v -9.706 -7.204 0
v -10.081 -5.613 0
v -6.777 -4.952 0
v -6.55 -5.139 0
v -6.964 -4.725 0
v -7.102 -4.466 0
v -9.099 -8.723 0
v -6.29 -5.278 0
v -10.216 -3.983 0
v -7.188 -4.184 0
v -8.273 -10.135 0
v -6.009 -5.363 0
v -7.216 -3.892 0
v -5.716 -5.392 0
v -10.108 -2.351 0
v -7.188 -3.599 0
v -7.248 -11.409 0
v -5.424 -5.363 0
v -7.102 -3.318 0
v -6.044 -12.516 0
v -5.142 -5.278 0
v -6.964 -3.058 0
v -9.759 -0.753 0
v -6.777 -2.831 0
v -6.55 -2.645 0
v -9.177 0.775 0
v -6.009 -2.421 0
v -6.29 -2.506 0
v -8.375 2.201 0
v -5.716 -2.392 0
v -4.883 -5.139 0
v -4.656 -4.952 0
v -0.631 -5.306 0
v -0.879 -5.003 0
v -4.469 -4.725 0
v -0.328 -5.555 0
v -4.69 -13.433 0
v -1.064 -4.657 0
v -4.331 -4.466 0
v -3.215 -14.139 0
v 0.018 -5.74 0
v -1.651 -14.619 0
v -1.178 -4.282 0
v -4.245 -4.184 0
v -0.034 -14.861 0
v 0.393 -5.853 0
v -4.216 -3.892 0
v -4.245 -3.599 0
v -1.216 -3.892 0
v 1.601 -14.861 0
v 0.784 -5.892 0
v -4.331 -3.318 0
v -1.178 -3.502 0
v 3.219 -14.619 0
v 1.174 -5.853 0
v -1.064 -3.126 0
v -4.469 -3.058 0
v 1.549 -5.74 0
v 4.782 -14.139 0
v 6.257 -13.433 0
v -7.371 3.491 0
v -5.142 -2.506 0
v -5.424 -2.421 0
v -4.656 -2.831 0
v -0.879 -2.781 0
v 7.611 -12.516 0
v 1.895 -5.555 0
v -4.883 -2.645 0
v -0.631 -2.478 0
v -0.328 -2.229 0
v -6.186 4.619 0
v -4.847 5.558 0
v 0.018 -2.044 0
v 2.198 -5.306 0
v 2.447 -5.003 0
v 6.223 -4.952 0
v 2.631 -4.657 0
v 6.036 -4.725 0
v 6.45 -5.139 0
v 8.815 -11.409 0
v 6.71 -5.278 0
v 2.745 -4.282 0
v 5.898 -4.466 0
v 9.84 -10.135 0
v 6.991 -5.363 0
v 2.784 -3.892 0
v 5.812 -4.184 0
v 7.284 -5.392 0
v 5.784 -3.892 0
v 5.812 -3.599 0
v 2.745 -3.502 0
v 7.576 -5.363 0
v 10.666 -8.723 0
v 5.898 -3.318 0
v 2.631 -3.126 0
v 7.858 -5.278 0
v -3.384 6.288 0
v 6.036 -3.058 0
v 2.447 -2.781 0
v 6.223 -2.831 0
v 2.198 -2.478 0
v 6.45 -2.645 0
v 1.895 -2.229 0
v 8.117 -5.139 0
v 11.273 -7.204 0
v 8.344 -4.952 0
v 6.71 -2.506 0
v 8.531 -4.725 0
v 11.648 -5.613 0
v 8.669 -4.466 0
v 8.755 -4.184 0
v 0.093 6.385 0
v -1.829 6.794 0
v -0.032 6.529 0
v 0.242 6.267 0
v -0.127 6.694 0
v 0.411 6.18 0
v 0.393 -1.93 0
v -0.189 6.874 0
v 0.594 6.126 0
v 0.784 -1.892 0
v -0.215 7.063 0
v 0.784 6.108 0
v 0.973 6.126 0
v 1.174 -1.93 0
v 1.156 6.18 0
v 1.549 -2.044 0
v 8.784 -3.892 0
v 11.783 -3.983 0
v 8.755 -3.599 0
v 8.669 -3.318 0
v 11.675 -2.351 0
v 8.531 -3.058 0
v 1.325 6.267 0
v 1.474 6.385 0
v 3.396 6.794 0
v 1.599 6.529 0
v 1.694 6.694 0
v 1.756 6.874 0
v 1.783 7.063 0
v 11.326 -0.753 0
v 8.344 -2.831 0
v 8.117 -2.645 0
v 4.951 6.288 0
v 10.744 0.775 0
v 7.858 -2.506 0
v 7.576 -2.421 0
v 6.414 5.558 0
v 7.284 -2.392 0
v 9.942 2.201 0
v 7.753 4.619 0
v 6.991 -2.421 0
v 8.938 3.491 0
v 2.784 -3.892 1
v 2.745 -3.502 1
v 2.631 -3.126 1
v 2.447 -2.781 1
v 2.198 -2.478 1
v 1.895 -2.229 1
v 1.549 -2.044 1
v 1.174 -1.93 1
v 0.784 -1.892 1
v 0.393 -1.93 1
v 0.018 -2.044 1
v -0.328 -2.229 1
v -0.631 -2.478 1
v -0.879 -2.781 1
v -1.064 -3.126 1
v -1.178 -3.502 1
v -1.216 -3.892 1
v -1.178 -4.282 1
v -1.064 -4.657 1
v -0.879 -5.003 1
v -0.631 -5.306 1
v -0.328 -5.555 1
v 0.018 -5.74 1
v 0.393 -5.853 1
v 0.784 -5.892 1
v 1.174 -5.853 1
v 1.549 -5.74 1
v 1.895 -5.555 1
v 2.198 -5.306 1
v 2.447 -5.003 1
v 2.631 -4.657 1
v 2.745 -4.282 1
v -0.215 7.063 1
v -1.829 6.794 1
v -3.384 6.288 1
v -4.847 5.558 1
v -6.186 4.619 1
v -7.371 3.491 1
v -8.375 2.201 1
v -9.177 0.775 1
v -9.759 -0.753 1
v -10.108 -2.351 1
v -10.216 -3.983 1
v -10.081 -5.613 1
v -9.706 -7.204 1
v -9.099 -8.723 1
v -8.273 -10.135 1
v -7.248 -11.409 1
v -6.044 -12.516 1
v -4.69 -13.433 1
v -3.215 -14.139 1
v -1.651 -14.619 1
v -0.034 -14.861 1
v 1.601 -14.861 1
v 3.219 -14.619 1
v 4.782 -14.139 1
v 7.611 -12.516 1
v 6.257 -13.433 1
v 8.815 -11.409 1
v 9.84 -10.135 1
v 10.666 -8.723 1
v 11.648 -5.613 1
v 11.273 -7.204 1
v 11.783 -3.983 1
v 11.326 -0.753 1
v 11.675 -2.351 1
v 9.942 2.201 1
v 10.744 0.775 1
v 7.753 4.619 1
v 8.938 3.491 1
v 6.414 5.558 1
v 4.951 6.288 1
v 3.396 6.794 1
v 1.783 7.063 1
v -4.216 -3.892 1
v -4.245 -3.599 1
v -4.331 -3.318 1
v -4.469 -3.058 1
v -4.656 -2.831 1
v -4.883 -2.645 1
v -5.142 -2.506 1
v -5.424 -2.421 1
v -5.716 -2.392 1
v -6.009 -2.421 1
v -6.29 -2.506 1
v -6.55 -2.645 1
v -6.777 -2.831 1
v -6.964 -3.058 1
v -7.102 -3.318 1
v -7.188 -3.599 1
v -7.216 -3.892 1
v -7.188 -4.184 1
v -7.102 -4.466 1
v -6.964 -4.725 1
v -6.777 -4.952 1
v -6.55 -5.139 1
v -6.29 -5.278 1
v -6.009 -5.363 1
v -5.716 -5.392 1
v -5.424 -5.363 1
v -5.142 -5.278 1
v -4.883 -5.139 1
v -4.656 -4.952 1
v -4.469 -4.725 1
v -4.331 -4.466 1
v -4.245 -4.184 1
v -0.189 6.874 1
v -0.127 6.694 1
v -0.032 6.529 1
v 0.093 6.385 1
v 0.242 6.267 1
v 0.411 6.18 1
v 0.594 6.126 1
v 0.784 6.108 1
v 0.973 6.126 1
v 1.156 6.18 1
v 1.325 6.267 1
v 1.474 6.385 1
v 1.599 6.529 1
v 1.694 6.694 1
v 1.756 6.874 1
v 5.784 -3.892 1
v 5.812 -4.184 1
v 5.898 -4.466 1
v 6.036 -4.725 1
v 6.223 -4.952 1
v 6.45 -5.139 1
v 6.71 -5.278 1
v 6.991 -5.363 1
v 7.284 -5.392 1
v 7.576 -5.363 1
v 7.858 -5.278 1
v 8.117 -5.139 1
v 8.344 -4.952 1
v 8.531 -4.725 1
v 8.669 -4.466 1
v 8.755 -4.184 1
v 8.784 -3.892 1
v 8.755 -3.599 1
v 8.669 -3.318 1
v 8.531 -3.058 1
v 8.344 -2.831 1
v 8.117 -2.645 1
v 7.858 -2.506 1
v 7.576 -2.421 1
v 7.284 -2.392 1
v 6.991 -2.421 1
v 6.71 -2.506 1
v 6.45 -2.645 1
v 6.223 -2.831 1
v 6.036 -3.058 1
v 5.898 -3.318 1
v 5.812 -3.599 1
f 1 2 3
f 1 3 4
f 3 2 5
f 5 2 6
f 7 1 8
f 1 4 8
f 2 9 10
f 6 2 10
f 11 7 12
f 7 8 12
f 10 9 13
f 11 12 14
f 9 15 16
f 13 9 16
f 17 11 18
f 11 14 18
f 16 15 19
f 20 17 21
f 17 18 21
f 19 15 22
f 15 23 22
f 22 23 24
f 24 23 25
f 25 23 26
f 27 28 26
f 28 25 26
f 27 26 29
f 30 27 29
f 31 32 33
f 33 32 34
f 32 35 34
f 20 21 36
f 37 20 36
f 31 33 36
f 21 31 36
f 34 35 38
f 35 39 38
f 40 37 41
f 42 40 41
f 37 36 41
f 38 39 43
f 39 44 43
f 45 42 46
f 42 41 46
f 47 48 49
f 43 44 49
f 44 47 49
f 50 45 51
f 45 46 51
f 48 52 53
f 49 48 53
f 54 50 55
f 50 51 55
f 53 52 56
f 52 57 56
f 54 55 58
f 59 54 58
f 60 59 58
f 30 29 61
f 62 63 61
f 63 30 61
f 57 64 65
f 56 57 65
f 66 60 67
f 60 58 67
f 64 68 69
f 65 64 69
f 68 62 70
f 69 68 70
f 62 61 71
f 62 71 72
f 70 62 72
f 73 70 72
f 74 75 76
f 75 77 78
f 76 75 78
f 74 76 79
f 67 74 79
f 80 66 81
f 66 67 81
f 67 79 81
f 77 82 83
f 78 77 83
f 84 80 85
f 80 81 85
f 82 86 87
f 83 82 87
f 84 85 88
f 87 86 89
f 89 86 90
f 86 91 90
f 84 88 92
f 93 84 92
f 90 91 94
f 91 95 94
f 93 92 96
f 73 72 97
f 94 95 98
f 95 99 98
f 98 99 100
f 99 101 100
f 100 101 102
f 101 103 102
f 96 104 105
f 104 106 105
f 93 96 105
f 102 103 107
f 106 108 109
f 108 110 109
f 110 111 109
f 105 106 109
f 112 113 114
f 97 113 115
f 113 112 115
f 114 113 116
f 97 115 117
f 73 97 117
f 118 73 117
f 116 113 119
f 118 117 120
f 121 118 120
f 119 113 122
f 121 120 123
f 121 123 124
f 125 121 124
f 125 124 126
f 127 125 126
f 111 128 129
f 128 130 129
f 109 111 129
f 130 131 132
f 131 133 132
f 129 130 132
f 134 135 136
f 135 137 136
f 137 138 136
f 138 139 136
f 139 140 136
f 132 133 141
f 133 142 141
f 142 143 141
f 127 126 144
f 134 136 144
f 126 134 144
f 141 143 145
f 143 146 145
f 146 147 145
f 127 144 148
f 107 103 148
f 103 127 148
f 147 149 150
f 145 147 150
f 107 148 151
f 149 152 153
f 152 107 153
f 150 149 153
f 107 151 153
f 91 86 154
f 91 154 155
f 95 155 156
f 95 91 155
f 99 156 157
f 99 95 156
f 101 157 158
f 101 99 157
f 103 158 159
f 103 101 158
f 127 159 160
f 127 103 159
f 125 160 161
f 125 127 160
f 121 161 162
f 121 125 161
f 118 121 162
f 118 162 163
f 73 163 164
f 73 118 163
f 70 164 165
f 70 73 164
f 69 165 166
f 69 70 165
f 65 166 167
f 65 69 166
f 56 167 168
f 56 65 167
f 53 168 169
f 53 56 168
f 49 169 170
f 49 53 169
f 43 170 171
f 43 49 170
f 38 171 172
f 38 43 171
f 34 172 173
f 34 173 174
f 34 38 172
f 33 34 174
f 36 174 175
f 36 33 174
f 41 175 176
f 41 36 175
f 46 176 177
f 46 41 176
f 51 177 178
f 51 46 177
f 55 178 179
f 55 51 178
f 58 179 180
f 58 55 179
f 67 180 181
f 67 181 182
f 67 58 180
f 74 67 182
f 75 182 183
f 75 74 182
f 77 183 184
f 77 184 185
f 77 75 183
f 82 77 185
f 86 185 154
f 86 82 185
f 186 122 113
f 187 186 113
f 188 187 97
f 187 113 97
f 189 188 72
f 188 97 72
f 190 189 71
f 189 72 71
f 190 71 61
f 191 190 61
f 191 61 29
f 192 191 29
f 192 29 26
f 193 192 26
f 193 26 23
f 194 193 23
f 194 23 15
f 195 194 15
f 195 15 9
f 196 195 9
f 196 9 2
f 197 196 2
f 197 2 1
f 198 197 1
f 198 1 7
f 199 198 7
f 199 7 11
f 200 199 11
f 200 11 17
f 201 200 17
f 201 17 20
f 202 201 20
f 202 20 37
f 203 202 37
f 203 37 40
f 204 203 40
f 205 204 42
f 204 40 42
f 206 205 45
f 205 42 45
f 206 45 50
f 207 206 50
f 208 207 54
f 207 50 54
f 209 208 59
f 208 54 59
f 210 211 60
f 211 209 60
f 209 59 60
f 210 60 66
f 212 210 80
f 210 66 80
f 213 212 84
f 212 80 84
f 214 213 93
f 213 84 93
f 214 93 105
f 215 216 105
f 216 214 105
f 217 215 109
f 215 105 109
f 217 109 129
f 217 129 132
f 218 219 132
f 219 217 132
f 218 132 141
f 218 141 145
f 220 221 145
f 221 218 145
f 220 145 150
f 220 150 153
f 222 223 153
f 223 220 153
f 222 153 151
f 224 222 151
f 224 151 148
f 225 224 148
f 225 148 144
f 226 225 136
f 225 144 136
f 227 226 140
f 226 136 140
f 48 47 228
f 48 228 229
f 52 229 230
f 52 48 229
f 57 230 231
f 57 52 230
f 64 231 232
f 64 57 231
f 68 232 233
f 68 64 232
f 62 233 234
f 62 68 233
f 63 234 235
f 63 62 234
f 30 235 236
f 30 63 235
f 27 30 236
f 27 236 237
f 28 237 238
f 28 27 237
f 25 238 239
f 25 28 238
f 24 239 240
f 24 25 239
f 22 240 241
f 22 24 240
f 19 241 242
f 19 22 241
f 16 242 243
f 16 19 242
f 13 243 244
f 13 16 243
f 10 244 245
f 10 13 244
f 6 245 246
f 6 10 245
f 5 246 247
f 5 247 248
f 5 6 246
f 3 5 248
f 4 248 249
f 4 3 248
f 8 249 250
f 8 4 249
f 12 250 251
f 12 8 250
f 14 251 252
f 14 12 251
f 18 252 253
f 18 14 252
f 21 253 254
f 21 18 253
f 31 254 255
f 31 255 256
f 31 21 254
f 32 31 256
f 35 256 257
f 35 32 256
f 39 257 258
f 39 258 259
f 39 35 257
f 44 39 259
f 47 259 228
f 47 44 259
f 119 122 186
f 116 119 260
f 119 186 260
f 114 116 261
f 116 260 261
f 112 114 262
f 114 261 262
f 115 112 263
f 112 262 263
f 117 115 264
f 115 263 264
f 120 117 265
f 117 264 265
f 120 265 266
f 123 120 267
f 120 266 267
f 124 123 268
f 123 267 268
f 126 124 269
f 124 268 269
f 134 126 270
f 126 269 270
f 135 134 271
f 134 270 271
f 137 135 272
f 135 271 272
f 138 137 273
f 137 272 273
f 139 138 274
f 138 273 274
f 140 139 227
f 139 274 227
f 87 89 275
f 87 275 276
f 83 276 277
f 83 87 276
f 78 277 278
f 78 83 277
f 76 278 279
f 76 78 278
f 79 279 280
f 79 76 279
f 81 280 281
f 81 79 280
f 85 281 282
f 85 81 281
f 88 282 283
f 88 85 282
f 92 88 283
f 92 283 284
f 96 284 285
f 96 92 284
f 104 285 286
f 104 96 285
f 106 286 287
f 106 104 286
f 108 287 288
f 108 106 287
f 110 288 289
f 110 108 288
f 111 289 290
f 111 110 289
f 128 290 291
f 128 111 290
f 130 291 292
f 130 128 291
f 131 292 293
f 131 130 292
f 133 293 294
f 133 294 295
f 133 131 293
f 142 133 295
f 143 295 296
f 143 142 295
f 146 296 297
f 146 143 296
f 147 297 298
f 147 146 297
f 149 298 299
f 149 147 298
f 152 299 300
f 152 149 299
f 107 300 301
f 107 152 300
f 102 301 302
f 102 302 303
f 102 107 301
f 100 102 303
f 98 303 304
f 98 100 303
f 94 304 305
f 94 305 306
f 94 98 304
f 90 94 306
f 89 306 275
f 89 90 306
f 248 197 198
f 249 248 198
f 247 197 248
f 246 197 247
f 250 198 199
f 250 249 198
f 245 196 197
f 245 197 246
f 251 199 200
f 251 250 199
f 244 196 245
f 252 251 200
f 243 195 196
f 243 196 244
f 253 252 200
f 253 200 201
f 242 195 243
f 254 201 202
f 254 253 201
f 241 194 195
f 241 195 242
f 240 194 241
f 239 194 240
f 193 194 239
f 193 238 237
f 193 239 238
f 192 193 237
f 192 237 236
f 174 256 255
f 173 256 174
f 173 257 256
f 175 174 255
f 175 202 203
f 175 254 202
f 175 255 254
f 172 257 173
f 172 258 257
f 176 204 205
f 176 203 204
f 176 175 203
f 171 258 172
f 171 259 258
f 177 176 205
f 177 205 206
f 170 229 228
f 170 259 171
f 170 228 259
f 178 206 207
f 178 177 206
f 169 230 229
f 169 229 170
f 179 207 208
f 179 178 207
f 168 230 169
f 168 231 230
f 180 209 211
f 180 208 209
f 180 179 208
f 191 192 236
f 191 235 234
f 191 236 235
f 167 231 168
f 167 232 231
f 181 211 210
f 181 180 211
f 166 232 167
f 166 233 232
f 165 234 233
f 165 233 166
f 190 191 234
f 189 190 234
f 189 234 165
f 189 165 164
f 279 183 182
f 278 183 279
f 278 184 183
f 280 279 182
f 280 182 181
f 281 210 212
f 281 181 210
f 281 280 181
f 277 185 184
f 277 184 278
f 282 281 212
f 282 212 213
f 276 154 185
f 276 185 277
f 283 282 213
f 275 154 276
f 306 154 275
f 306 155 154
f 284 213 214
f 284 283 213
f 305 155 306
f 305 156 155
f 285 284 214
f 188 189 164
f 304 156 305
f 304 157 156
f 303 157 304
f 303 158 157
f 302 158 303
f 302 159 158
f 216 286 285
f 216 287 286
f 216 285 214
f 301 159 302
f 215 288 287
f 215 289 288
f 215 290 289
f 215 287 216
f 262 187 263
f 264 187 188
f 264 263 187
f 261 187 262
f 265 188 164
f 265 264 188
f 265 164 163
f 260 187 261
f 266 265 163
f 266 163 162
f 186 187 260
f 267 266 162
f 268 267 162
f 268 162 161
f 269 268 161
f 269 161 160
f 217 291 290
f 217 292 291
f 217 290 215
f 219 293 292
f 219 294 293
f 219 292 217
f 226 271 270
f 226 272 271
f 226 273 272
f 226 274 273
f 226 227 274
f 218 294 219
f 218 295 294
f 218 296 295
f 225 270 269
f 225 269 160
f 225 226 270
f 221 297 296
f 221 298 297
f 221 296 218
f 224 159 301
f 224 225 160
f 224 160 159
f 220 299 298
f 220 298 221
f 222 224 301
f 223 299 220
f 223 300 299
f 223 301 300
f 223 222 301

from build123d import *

# Parameters (mm, degrees)
SKETCH_1_R          = 11
SKETCH_1_R_2        = 1.5
SKETCH_1_R_3        = 2
EXTRUDE_1_DEPTH     = 1
SKETCH_2_R          = 1
CUT_EXTRUDE_1_DEPTH = 10


with BuildPart() as part:
    # 草图1 → 凸台-拉伸1 (new body)
    with BuildSketch(Plane.XY):
        with Locations((0.783567134, -3.891783567)):
            Circle(SKETCH_1_R)
        with Locations((-5.716432866, -3.891783567)):
            Circle(SKETCH_1_R_2, mode=Mode.SUBTRACT)
        with Locations(Location((7.283567134, -3.891783567, 0), (0, 0, 180))):
            Circle(SKETCH_1_R_2, mode=Mode.SUBTRACT)
        with Locations((0.783567134, -3.891783567)):
            Circle(SKETCH_1_R_3, mode=Mode.SUBTRACT)
    extrude(amount=EXTRUDE_1_DEPTH)

    # 草图2 → 切除-拉伸1 (cut)
    with BuildSketch(Plane.XY.offset(1)):
        with Locations((0.783567134, 7.108216433)):
            Circle(SKETCH_2_R)
    extrude(amount=-CUT_EXTRUDE_1_DEPTH, mode=Mode.SUBTRACT)


solid = part.part
